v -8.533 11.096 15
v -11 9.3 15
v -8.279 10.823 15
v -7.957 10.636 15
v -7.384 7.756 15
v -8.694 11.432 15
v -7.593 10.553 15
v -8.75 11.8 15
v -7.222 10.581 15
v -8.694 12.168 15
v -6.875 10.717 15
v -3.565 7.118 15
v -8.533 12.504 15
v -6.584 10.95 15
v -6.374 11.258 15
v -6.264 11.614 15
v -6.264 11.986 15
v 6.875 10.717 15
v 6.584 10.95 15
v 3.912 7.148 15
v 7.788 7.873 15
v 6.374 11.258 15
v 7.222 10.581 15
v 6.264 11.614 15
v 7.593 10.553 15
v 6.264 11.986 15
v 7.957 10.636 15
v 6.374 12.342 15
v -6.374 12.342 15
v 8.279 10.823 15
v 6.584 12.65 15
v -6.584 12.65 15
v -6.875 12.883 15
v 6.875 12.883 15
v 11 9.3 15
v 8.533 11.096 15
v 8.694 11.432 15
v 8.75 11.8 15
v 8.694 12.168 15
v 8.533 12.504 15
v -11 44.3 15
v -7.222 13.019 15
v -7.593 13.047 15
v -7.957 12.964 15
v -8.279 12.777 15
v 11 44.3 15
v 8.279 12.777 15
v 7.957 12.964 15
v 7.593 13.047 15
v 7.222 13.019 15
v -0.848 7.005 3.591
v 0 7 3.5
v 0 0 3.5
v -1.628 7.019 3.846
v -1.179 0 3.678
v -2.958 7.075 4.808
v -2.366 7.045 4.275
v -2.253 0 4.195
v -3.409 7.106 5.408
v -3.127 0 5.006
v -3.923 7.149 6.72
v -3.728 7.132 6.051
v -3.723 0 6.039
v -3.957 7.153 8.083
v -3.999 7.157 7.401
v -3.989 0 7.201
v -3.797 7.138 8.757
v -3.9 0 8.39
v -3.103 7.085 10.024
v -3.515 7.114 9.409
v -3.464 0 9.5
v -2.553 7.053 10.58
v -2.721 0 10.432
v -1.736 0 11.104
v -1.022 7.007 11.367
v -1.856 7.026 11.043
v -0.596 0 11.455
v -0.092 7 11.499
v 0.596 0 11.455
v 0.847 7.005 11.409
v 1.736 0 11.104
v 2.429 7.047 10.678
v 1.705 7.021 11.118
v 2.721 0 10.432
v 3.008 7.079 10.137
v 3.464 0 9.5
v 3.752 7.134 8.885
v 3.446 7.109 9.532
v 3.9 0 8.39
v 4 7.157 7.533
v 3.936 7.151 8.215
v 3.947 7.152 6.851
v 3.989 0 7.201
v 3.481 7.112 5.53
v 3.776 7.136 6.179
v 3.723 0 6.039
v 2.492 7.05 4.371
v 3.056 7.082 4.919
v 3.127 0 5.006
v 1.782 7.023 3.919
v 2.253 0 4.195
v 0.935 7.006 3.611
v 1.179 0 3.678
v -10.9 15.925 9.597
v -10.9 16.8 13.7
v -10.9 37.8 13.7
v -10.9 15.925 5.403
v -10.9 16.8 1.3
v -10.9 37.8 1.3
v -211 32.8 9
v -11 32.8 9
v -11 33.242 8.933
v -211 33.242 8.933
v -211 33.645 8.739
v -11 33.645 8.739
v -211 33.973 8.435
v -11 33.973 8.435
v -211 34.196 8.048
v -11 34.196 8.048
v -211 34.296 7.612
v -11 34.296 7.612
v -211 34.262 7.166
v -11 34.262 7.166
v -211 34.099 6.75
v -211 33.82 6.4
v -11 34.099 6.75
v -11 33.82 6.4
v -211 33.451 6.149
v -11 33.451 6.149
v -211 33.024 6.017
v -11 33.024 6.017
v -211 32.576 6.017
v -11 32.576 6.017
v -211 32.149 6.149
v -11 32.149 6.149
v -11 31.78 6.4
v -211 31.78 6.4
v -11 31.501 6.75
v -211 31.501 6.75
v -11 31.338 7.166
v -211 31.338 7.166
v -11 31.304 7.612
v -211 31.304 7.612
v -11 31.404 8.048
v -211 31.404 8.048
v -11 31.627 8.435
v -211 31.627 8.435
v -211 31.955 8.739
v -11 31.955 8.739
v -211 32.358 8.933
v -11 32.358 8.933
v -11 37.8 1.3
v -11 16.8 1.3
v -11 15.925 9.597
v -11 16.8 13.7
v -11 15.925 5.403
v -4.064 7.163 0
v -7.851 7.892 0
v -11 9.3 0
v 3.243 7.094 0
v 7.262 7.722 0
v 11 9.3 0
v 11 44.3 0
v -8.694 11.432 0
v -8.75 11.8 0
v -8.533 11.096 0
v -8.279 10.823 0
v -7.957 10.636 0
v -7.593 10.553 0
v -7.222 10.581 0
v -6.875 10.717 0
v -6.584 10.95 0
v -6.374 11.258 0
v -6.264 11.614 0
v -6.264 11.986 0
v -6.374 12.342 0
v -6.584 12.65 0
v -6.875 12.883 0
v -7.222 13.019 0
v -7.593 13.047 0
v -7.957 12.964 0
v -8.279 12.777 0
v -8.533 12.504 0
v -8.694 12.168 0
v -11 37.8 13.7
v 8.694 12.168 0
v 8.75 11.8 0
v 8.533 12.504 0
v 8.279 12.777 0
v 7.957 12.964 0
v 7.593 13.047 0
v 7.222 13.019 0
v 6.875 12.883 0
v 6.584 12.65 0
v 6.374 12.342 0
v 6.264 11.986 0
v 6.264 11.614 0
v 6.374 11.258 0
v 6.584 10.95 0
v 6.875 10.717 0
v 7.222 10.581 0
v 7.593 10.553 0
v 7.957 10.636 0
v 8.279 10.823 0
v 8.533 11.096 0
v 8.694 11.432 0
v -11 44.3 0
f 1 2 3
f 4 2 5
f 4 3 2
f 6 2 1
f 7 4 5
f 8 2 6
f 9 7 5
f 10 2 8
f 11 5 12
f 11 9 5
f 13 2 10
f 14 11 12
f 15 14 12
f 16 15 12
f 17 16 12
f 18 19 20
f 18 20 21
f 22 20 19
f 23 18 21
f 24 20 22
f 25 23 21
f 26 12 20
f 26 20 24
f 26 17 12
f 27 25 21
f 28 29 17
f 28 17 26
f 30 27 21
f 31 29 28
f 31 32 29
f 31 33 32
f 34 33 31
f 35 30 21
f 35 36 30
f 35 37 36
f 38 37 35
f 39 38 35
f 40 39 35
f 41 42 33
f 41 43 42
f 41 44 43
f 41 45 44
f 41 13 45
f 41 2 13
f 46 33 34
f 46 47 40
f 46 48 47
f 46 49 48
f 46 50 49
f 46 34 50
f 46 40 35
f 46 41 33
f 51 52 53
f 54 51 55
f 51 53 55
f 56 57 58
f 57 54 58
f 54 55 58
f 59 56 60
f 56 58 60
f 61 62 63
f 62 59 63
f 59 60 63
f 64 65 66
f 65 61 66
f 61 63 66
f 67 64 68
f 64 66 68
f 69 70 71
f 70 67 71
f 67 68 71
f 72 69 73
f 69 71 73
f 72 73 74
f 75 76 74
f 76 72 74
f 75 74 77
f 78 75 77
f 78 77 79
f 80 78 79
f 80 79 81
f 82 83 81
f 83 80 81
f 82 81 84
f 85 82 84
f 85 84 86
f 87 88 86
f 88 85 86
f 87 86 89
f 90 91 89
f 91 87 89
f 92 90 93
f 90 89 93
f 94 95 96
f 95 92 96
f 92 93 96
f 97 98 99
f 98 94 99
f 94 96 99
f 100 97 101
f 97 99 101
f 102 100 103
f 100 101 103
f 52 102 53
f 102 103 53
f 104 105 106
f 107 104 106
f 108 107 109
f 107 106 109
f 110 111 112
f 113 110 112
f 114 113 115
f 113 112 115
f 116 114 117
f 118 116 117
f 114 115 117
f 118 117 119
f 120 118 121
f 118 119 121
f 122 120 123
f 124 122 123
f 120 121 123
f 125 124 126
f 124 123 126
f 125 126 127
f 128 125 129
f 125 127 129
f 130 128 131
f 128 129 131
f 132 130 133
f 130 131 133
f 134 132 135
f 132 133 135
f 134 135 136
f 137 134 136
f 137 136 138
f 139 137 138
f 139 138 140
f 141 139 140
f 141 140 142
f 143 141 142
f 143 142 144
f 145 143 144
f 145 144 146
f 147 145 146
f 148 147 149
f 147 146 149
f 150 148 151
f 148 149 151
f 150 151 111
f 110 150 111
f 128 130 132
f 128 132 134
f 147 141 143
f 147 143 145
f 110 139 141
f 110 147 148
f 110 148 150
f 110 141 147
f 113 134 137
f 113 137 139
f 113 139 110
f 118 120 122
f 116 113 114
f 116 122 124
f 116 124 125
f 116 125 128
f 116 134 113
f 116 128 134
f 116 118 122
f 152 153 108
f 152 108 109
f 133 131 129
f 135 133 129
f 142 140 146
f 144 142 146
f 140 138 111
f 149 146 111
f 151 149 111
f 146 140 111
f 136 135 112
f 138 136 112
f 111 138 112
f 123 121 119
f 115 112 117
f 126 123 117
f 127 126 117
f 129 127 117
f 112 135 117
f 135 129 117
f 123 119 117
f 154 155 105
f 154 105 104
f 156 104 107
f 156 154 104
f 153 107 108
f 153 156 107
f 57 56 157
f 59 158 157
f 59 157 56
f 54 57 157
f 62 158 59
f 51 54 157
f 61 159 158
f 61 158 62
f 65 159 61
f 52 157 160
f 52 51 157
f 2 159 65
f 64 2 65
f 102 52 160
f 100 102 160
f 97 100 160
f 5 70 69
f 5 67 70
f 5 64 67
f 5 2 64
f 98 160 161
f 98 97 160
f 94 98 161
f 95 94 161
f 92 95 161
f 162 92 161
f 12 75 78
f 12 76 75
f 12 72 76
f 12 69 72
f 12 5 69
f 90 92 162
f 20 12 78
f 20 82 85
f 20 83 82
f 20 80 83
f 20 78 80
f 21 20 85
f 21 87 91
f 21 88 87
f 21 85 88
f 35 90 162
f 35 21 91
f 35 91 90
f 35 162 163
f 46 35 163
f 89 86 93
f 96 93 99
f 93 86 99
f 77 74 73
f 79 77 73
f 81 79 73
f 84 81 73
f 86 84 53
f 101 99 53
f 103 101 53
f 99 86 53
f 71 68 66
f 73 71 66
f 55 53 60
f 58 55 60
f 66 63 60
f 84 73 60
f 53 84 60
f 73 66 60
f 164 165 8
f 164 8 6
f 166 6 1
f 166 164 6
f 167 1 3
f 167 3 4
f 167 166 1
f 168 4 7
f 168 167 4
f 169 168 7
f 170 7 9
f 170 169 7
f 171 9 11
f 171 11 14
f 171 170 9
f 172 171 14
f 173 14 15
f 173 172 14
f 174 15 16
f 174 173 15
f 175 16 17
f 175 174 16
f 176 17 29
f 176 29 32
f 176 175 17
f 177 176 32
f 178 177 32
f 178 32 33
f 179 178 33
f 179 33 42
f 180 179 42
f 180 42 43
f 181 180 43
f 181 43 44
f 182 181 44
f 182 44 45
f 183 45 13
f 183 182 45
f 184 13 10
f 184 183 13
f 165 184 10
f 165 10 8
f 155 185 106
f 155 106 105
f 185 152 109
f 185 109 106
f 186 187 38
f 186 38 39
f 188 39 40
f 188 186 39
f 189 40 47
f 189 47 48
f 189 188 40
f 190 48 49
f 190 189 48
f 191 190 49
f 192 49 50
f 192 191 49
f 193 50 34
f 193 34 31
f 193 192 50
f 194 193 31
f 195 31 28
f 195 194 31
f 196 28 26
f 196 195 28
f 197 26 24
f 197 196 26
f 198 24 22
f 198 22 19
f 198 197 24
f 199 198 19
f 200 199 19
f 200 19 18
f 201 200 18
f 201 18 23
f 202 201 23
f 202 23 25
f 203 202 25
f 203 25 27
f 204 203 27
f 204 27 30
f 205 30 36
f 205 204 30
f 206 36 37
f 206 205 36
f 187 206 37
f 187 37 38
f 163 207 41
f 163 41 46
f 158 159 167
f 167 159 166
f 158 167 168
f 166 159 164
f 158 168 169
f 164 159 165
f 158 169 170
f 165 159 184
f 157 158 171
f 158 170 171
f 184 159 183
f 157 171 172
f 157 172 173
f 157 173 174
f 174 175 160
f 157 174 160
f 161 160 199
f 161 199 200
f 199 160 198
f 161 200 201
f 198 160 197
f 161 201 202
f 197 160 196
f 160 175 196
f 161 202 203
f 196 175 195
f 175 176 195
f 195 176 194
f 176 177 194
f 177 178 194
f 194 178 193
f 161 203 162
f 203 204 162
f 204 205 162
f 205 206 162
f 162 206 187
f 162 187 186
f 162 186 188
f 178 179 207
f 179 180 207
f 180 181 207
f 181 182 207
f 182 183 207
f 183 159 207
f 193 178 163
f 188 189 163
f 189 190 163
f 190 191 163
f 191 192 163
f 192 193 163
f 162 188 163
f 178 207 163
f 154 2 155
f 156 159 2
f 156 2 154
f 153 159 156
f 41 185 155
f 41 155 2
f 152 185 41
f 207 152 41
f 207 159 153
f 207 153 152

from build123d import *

# Parameters (mm, degrees)
ESQUISSE1_W             = 22
ESQUISSE1_H             = 44.3
ESQUISSE1_R             = 1.25
BOSS_EXTRU_1_DEPTH      = 15
ENL_V_MAT_EXTRU_1_DEPTH = 49.046748069
BOSS_EXTRU_2_REACH      = 50.047
ESQUISSE3_R             = 4
ENL_V_MAT_EXTRU_2_DEPTH = 0.1
ESQUISSE5_R             = 1.5
BOSS_EXTRU_3_DEPTH      = 200


with BuildPart() as part:
    # Esquisse1 → Boss.-Extru.1 (new body)
    with BuildSketch(Plane.XY):
        with Locations((0, 22.15)):
            Rectangle(ESQUISSE1_W, ESQUISSE1_H)
        with Locations((7.5, 11.8)):
            Circle(ESQUISSE1_R, mode=Mode.SUBTRACT)
        with Locations(Location((-7.5, 11.8, 0), (0, 0, 180))):
            Circle(ESQUISSE1_R, mode=Mode.SUBTRACT)
    extrude(amount=BOSS_EXTRU_1_DEPTH)

    # Esquisse2 → Enlèv. mat.-Extru.1 (cut, through all)
    with BuildSketch(Plane.XY.offset(15)):
        with BuildLine():
            Line((-11, 9.3), (-11, 0))
            Line((-11, 0), (11, 0))
            Line((11, 0), (11, 9.3))
            add(Edge.make_bspline(
                [(-11, 9.3), (-7.625374572, 7.236730077), (0, 6.763269923), (7.625374572, 7.236730077), (11, 9.3)],
                knots=[0, 0, 0, 0, 0.5, 1, 1, 1, 1], degree=3))
        make_face()
    extrude(amount=-ENL_V_MAT_EXTRU_1_DEPTH, mode=Mode.SUBTRACT)

    # Esquisse3 → Boss.-Extru.2 (add, up to next)
    with BuildSketch(Plane(origin=(0, 0, 0), x_dir=(1, 0, 0), z_dir=(0, 1, 0)), mode=Mode.PRIVATE) as boss_extru_2_sk1:
        with Locations(Location((0, -7.5, 0), (0, 0, 90))):
            Circle(ESQUISSE3_R)
    boss_extru_2_tool1 = extrude(boss_extru_2_sk1.sketch, amount=BOSS_EXTRU_2_REACH, mode=Mode.PRIVATE) - part.part
    add(boss_extru_2_tool1.solids().sort_by_distance((0, 0, 7.5))[0])

    # Esquisse4 → Enlèv. mat.-Extru.2 (cut)
    with BuildSketch(Plane.ZY.offset(11)):
        with BuildLine():
            Line((1.3, 37.8), (13.7, 37.8))
            Line((13.7, 37.8), (13.7, 16.8))
            ThreePointArc((13.7, 16.8), (7.5, 15.814731131), (1.3, 16.8))
            Line((1.3, 16.8), (1.3, 37.8))
        make_face()
    extrude(amount=-ENL_V_MAT_EXTRU_2_DEPTH, mode=Mode.SUBTRACT)


with BuildPart() as body_2:
    # Esquisse5 → Boss.-Extru.3 (new body)
    with BuildSketch(Plane.ZY.offset(11)):
        with Locations((7.5, 32.8)):
            Circle(ESQUISSE5_R)
    extrude(amount=BOSS_EXTRU_3_DEPTH)


solid = Compound([part.part, body_2.part])
